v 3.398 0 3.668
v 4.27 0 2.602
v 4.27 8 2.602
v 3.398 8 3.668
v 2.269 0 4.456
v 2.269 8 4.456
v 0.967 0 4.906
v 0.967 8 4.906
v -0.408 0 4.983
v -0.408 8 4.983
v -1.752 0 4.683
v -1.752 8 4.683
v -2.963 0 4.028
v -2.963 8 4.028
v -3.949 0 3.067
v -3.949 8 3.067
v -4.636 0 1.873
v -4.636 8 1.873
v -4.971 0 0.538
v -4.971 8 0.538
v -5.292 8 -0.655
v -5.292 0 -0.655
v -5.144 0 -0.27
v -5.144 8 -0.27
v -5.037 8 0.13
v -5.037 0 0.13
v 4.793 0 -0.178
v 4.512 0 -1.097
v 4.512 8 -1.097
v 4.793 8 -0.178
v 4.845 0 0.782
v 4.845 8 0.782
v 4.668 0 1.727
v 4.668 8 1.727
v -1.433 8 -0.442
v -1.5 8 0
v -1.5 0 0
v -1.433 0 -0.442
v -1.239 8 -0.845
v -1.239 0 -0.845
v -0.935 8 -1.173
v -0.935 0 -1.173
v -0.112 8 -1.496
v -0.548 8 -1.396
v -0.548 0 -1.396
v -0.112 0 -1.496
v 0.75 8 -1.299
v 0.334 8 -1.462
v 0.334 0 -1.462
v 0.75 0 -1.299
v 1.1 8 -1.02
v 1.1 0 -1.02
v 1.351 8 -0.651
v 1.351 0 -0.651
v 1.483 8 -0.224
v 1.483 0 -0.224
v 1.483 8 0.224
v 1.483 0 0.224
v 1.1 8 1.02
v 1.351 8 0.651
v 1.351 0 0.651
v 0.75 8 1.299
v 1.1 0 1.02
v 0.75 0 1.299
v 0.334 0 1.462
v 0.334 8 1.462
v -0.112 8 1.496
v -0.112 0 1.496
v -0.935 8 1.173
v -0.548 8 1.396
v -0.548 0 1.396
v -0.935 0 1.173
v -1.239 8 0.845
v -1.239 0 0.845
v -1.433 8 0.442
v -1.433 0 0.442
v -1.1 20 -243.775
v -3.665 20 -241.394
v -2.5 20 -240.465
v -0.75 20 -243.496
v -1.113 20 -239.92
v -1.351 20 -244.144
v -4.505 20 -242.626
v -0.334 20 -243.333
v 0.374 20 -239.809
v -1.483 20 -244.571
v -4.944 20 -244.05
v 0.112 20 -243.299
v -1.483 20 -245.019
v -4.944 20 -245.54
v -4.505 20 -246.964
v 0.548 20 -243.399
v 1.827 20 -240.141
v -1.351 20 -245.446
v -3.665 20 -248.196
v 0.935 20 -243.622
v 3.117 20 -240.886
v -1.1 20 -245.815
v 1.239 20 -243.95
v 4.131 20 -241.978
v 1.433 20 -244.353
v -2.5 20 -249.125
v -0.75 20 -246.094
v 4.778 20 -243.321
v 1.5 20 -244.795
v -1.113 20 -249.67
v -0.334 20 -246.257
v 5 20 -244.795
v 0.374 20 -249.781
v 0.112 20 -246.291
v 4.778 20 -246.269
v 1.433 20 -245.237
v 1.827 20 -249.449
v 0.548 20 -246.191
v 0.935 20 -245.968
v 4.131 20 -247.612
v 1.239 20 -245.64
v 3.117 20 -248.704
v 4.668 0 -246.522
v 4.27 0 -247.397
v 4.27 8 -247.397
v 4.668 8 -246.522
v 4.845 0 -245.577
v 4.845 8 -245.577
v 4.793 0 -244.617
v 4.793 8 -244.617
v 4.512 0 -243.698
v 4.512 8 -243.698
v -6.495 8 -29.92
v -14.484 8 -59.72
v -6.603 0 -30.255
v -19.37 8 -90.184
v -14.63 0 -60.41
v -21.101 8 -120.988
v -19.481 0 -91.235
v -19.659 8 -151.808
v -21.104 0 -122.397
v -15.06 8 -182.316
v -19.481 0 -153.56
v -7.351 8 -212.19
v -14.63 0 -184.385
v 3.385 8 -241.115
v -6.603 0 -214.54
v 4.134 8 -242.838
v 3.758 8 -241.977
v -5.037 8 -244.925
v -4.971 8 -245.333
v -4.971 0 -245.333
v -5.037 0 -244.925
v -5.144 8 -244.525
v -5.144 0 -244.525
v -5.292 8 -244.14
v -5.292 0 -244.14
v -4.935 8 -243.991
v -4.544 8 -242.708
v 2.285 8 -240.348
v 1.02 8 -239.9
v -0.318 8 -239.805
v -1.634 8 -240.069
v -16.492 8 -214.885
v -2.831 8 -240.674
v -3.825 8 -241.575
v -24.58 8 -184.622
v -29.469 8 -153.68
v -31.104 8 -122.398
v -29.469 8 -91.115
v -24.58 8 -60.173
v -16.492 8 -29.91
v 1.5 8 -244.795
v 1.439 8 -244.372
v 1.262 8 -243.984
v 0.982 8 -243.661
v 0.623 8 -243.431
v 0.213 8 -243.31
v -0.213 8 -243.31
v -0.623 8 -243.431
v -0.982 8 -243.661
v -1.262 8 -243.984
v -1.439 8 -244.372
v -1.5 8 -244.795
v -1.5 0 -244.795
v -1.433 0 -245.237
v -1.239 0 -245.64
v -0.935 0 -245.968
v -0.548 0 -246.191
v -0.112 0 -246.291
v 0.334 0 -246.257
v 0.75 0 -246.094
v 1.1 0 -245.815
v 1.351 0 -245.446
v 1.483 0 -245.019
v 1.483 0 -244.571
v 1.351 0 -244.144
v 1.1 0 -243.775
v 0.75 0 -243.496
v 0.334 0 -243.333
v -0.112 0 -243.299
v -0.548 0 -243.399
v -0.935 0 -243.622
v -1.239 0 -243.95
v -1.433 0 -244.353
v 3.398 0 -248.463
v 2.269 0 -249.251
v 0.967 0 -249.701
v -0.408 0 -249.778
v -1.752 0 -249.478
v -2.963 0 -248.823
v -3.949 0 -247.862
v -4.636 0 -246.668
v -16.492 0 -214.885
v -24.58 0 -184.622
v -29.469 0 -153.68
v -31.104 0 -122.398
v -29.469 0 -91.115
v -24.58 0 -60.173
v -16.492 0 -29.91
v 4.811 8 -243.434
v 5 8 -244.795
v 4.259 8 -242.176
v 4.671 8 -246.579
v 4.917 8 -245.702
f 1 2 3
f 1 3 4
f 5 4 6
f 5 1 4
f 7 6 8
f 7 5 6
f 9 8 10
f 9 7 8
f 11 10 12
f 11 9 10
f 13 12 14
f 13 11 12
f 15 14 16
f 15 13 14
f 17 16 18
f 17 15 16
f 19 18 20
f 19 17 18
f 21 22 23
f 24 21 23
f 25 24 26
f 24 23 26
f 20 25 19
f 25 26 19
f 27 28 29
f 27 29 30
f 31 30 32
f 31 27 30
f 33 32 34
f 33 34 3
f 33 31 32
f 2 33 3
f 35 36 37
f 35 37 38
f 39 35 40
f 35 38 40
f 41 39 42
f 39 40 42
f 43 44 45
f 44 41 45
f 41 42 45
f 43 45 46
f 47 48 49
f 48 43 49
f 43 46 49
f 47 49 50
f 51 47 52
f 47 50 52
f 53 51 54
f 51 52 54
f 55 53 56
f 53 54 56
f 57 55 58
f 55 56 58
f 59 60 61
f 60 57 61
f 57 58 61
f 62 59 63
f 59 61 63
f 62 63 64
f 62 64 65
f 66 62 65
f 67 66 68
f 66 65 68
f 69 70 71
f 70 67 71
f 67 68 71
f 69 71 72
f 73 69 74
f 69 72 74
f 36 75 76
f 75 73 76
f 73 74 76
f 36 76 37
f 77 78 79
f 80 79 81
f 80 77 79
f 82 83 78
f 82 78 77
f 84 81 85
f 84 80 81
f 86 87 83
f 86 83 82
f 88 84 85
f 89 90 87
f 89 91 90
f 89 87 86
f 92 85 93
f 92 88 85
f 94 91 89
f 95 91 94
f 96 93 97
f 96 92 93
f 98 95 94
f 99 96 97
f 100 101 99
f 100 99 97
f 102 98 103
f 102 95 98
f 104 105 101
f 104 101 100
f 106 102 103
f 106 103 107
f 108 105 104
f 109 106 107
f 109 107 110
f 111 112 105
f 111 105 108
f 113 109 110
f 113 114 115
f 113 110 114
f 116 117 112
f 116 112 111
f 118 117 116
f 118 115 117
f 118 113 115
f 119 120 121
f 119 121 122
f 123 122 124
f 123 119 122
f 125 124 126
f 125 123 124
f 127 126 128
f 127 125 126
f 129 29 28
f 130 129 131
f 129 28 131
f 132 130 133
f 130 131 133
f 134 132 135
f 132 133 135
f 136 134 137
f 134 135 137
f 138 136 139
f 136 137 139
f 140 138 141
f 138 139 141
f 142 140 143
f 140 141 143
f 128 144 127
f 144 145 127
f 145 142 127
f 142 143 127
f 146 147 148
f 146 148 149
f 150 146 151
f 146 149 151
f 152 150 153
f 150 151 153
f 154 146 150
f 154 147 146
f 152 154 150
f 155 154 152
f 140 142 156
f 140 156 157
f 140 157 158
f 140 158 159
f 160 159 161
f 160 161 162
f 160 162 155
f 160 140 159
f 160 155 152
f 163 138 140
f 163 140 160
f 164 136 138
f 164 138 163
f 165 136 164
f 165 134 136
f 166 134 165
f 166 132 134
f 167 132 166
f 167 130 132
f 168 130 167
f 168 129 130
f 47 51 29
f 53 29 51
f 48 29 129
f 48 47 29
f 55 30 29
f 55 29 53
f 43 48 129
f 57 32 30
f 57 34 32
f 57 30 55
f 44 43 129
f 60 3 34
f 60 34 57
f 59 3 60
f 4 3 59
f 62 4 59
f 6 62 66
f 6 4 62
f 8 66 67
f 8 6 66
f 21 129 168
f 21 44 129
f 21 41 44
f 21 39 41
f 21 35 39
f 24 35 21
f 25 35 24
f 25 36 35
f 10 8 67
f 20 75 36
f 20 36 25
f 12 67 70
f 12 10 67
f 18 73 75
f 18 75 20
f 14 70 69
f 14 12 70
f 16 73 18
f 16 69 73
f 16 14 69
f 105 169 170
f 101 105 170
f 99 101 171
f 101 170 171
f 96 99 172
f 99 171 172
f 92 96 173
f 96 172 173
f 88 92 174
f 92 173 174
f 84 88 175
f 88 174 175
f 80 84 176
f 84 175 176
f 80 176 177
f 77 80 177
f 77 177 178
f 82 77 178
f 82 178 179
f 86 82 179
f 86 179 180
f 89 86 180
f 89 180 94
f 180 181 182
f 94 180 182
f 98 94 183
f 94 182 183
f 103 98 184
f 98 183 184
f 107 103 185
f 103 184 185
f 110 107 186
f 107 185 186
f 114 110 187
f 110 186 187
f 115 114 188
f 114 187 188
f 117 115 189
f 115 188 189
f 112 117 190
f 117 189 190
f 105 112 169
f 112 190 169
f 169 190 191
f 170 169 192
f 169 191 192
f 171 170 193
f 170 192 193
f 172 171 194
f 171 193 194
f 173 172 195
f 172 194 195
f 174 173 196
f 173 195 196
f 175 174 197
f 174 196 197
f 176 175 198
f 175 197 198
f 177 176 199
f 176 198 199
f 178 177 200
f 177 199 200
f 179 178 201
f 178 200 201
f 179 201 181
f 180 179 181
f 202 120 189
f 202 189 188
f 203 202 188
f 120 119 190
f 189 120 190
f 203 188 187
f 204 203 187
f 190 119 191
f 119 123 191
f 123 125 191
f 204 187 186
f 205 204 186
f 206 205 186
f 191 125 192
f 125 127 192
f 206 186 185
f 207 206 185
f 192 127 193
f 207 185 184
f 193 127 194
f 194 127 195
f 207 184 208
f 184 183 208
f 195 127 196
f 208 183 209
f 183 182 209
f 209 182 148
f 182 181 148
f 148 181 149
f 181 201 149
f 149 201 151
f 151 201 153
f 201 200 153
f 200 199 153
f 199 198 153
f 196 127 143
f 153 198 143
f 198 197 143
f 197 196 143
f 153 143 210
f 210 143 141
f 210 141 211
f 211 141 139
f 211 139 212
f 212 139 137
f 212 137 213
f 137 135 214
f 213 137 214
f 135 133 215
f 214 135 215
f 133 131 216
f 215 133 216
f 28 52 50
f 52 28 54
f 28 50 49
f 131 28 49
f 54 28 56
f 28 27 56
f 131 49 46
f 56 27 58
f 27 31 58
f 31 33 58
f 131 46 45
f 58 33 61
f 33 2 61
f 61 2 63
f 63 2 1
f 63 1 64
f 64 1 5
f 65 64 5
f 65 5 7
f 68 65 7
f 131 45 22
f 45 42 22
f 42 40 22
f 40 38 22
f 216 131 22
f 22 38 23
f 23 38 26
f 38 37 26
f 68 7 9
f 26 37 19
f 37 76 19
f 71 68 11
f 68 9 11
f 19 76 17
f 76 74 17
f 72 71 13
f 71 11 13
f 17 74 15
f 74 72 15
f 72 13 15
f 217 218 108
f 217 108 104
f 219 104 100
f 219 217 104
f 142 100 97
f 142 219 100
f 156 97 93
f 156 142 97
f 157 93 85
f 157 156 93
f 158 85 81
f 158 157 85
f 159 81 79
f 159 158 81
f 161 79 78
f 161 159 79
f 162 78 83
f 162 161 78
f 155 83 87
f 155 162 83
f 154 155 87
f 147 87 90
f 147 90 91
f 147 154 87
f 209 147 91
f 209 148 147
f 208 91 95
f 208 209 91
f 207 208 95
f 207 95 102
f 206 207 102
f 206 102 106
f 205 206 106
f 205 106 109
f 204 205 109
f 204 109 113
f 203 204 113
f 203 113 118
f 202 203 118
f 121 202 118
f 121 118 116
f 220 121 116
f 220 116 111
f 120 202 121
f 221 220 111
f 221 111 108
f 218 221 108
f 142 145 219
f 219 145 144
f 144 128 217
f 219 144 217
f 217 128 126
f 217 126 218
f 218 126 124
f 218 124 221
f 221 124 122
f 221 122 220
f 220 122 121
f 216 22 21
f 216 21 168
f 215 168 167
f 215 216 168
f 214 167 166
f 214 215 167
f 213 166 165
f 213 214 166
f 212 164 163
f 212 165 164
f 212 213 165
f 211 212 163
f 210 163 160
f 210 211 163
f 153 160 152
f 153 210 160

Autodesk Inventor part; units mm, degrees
ref_plane "YZ Plane" through (0, 0, 0) normal (1, 0, 0) x (0, 1, 0)
ref_plane "XZ Plane" through (0, 0, 0) normal (0, 1, 0) x (-1, 0, 0)
ref_plane "XY Plane" through (0, 0, 0) normal (0, 0, 1) x (1, 0, 0)
sketch "Sketch1" plane through (0, 0, 0) normal (0, 1, 0) x (-1, 0, 0)
  line L0 (0, 0) -> (0, -244.795) construction
  line L1 (-5, 0) -> (-5, -244.795)
  line L2 (5, -244.795) -> (5, 0)
  arc A0 (5, 0) -> (-5, 0) centre (0, 0) ccw
  arc A1 (-5, -244.795) -> (5, -244.795) centre (0, -244.795) ccw
  circle A2 centre (0, 0) radius 1.5
  circle A3 centre (0, -244.795) radius 1.5
  arc A4 (-5, -244.795) -> (-5, 0) centre (-278.8957, -122.3975) ccw
  arc A5 (5, -244.795) -> (5, 0) centre (-268.8957, -122.3975) ccw
  point P0 (0, -122.3975)
  dimension "d0" = 244.795
  dimension "d1" = 10
  dimension "d2" = 3
  dimension "d3" = 3
  dimension "d18" = 300
  dimension "d19" = 300
extrude "Extrusion1" add sketch "Sketch1" along normal blind 8 contours A0 L2 A4 | A4 L2 A1 | A5 L2 A4
sketch "Sketch2" plane through (0, 8, 0) normal (0, 1, 0) x (1, 0, 0)
  arc A0 (5, 244.795) -> (-5, 244.795) centre (0, 244.795) ccw projected
  arc A1 (-5, 0) -> (5, 0) centre (0, 0) ccw projected
  circle A2 centre (0, 244.795) radius 1.5 projected
  circle A3 centre (0, 0) radius 1.5 projected
  circle A4 centre (0, 244.795) radius 5
  arc A5 (-5, 244.795) -> (-5, 0) centre (268.8957, 122.3975) ccw projected
  arc A6 (5, 244.795) -> (5, 0) centre (278.8957, 122.3975) ccw projected
  point P0 (-5, 244.795)
  point P1 (5, 244.795)
  dimension "d12" = 10
extrude "Extrusion2" add sketch "Sketch2" along normal blind 12 contours A6 A4 A0 | A4 A6
fillet "Fillet1" radius 4 4 edges at (5, 4, -244.795) (-5, 4, -244.795) (5, 4, 0) (-5, 4, 0)
sketch "Sketch3" plane through (0, 0, 0) normal (0, -1, 0) x (1, 0, 0)
  arc A0 (-4.971, -245.3326) -> (4.2698, -247.3967) centre (0, -244.795) ccw projected
  arc A1 (4.2698, 2.6017) -> (-4.971, 0.5376) centre (0, 0) ccw projected
  circle A2 centre (0, -244.795) radius 1.5 projected
  circle A3 centre (0, 0) radius 1.5 projected
  arc A4 (-5.292, -0.6555) -> (-5.292, -244.1395) centre (268.8957, -122.3975) ccw projected
  arc A5 (4.5124, -1.097) -> (4.5124, -243.698) centre (278.8957, -122.3975) ccw projected
  arc A6 (4.5124, -1.097) -> (4.2698, 2.6017) centre (0.854, 0.5203) ccw projected
  arc A7 (-5.292, -0.6555) -> (-4.971, 0.5376) centre (-8.9478, 0.9677) ccw projected
  arc A8 (-4.971, -245.3326) -> (-5.292, -244.1395) centre (-8.9478, -245.7627) ccw projected
  arc A9 (4.2698, -247.3967) -> (4.5124, -243.698) centre (0.854, -245.3153) ccw projected
